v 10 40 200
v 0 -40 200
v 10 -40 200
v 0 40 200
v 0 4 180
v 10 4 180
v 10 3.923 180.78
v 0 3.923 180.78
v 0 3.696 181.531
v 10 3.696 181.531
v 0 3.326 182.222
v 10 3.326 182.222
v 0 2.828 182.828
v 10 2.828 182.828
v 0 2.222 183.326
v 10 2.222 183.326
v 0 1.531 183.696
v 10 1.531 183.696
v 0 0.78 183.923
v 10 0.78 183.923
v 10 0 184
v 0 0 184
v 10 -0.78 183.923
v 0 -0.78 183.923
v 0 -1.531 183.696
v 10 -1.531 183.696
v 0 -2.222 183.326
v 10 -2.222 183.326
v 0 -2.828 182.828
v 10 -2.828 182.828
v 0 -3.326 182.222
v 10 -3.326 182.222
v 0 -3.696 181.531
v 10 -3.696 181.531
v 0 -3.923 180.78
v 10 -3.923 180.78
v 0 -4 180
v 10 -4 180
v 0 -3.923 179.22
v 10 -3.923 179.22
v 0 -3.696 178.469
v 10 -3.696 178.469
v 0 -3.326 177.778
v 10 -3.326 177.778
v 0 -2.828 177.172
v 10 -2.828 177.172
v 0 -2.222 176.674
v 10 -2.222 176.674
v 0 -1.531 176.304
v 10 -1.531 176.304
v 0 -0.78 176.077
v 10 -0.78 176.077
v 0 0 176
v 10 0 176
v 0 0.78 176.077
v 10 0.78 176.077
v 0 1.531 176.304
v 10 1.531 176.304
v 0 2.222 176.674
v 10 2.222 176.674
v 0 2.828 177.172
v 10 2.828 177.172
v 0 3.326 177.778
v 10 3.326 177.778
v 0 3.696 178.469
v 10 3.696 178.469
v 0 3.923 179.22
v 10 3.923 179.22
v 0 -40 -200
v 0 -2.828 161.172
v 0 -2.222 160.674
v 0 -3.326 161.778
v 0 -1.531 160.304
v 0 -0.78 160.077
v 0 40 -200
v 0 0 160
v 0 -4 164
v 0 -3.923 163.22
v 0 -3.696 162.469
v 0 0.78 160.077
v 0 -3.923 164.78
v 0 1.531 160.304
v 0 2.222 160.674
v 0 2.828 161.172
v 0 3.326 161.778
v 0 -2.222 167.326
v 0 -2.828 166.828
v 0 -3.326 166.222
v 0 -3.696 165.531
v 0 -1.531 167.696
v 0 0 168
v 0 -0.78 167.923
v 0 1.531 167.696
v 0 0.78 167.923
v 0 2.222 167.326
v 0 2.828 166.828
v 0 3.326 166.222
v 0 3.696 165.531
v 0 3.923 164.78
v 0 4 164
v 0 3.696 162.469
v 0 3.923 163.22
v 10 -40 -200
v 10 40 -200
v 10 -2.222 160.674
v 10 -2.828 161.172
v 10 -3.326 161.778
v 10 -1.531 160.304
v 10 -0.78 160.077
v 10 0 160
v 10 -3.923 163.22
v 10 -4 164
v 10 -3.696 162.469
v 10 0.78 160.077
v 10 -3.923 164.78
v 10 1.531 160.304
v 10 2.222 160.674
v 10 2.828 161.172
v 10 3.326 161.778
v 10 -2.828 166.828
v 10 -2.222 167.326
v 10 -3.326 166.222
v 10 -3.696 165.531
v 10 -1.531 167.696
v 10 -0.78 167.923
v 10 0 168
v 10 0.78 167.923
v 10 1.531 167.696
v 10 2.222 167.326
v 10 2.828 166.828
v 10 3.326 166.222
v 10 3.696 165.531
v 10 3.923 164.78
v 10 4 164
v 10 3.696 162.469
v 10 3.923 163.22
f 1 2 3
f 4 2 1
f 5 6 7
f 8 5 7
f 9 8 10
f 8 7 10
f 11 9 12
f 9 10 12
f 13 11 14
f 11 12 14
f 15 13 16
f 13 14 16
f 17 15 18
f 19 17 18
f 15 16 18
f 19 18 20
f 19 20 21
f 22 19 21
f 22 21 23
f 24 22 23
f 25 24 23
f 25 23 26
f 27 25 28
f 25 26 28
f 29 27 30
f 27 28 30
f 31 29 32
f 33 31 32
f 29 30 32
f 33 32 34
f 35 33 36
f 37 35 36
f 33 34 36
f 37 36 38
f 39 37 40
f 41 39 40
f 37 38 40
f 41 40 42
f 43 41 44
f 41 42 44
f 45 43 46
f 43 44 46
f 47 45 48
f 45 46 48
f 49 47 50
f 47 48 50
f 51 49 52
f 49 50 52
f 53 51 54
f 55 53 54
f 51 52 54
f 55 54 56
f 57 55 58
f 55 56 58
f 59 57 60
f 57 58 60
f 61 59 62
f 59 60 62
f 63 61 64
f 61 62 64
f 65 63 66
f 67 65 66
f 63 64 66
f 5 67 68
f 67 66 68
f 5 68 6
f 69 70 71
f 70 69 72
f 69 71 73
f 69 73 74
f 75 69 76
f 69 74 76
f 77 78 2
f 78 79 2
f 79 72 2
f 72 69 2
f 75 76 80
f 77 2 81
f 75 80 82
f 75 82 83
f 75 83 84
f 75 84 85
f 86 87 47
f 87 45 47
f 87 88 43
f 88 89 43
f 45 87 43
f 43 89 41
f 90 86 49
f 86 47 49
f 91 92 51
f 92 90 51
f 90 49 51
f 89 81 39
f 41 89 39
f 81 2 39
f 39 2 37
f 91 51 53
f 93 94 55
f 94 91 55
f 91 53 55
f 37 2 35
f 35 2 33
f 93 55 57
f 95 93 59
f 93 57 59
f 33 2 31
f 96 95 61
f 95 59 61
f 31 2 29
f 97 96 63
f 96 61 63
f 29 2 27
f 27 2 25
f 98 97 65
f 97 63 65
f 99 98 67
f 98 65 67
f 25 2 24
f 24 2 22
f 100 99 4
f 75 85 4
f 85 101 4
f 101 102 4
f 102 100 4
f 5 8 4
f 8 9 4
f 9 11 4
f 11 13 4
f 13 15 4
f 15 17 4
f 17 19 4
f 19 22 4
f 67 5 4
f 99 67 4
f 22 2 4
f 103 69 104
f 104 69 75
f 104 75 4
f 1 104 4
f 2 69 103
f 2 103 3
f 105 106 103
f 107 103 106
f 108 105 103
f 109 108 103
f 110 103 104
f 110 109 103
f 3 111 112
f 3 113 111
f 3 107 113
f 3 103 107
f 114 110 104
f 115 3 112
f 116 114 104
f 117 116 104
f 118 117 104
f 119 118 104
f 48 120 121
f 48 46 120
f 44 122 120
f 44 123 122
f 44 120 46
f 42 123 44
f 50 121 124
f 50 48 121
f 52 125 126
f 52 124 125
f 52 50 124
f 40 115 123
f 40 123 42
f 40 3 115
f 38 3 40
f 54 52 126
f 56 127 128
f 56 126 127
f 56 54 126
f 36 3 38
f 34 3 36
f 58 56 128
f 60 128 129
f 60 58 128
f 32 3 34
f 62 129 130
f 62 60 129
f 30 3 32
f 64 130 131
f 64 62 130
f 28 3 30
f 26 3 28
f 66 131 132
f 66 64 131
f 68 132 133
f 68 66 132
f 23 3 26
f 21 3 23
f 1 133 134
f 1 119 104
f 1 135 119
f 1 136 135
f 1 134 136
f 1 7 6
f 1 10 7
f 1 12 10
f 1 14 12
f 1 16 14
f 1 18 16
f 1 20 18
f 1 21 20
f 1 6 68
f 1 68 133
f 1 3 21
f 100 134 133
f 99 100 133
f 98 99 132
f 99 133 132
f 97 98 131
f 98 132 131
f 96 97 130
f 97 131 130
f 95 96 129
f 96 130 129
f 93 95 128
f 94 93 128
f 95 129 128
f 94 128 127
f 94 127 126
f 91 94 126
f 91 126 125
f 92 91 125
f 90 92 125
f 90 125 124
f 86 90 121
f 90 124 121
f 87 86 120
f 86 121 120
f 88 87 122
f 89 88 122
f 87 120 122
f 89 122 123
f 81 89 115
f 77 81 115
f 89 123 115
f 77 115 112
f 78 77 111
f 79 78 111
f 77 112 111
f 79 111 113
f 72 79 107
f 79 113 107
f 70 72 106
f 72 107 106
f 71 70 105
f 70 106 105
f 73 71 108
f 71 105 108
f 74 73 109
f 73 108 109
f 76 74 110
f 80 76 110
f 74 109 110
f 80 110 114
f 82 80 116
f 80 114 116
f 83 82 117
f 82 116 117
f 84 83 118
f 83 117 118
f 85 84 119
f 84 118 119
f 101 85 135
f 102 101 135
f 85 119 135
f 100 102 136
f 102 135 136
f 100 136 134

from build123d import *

# Parameters (mm, degrees)
SKETCH_W     = 80
SKETCH_H     = 400
PAD_DEPTH    = 10
SKETCH001_R  = 4
POCKET_DEPTH = 10


with BuildPart() as part:
    # Sketch → Pad (new body)
    with BuildSketch(Plane.YZ):
        Rectangle(SKETCH_W, SKETCH_H)
    extrude(amount=PAD_DEPTH)

    # Sketch001 → Pocket (cut)
    with BuildSketch(Plane.YZ.offset(10)):
        with Locations((0, 180)):
            Circle(SKETCH001_R)
        with Locations((0, 164)):
            Circle(SKETCH001_R)
    extrude(amount=-POCKET_DEPTH, mode=Mode.SUBTRACT)


solid = part.part
